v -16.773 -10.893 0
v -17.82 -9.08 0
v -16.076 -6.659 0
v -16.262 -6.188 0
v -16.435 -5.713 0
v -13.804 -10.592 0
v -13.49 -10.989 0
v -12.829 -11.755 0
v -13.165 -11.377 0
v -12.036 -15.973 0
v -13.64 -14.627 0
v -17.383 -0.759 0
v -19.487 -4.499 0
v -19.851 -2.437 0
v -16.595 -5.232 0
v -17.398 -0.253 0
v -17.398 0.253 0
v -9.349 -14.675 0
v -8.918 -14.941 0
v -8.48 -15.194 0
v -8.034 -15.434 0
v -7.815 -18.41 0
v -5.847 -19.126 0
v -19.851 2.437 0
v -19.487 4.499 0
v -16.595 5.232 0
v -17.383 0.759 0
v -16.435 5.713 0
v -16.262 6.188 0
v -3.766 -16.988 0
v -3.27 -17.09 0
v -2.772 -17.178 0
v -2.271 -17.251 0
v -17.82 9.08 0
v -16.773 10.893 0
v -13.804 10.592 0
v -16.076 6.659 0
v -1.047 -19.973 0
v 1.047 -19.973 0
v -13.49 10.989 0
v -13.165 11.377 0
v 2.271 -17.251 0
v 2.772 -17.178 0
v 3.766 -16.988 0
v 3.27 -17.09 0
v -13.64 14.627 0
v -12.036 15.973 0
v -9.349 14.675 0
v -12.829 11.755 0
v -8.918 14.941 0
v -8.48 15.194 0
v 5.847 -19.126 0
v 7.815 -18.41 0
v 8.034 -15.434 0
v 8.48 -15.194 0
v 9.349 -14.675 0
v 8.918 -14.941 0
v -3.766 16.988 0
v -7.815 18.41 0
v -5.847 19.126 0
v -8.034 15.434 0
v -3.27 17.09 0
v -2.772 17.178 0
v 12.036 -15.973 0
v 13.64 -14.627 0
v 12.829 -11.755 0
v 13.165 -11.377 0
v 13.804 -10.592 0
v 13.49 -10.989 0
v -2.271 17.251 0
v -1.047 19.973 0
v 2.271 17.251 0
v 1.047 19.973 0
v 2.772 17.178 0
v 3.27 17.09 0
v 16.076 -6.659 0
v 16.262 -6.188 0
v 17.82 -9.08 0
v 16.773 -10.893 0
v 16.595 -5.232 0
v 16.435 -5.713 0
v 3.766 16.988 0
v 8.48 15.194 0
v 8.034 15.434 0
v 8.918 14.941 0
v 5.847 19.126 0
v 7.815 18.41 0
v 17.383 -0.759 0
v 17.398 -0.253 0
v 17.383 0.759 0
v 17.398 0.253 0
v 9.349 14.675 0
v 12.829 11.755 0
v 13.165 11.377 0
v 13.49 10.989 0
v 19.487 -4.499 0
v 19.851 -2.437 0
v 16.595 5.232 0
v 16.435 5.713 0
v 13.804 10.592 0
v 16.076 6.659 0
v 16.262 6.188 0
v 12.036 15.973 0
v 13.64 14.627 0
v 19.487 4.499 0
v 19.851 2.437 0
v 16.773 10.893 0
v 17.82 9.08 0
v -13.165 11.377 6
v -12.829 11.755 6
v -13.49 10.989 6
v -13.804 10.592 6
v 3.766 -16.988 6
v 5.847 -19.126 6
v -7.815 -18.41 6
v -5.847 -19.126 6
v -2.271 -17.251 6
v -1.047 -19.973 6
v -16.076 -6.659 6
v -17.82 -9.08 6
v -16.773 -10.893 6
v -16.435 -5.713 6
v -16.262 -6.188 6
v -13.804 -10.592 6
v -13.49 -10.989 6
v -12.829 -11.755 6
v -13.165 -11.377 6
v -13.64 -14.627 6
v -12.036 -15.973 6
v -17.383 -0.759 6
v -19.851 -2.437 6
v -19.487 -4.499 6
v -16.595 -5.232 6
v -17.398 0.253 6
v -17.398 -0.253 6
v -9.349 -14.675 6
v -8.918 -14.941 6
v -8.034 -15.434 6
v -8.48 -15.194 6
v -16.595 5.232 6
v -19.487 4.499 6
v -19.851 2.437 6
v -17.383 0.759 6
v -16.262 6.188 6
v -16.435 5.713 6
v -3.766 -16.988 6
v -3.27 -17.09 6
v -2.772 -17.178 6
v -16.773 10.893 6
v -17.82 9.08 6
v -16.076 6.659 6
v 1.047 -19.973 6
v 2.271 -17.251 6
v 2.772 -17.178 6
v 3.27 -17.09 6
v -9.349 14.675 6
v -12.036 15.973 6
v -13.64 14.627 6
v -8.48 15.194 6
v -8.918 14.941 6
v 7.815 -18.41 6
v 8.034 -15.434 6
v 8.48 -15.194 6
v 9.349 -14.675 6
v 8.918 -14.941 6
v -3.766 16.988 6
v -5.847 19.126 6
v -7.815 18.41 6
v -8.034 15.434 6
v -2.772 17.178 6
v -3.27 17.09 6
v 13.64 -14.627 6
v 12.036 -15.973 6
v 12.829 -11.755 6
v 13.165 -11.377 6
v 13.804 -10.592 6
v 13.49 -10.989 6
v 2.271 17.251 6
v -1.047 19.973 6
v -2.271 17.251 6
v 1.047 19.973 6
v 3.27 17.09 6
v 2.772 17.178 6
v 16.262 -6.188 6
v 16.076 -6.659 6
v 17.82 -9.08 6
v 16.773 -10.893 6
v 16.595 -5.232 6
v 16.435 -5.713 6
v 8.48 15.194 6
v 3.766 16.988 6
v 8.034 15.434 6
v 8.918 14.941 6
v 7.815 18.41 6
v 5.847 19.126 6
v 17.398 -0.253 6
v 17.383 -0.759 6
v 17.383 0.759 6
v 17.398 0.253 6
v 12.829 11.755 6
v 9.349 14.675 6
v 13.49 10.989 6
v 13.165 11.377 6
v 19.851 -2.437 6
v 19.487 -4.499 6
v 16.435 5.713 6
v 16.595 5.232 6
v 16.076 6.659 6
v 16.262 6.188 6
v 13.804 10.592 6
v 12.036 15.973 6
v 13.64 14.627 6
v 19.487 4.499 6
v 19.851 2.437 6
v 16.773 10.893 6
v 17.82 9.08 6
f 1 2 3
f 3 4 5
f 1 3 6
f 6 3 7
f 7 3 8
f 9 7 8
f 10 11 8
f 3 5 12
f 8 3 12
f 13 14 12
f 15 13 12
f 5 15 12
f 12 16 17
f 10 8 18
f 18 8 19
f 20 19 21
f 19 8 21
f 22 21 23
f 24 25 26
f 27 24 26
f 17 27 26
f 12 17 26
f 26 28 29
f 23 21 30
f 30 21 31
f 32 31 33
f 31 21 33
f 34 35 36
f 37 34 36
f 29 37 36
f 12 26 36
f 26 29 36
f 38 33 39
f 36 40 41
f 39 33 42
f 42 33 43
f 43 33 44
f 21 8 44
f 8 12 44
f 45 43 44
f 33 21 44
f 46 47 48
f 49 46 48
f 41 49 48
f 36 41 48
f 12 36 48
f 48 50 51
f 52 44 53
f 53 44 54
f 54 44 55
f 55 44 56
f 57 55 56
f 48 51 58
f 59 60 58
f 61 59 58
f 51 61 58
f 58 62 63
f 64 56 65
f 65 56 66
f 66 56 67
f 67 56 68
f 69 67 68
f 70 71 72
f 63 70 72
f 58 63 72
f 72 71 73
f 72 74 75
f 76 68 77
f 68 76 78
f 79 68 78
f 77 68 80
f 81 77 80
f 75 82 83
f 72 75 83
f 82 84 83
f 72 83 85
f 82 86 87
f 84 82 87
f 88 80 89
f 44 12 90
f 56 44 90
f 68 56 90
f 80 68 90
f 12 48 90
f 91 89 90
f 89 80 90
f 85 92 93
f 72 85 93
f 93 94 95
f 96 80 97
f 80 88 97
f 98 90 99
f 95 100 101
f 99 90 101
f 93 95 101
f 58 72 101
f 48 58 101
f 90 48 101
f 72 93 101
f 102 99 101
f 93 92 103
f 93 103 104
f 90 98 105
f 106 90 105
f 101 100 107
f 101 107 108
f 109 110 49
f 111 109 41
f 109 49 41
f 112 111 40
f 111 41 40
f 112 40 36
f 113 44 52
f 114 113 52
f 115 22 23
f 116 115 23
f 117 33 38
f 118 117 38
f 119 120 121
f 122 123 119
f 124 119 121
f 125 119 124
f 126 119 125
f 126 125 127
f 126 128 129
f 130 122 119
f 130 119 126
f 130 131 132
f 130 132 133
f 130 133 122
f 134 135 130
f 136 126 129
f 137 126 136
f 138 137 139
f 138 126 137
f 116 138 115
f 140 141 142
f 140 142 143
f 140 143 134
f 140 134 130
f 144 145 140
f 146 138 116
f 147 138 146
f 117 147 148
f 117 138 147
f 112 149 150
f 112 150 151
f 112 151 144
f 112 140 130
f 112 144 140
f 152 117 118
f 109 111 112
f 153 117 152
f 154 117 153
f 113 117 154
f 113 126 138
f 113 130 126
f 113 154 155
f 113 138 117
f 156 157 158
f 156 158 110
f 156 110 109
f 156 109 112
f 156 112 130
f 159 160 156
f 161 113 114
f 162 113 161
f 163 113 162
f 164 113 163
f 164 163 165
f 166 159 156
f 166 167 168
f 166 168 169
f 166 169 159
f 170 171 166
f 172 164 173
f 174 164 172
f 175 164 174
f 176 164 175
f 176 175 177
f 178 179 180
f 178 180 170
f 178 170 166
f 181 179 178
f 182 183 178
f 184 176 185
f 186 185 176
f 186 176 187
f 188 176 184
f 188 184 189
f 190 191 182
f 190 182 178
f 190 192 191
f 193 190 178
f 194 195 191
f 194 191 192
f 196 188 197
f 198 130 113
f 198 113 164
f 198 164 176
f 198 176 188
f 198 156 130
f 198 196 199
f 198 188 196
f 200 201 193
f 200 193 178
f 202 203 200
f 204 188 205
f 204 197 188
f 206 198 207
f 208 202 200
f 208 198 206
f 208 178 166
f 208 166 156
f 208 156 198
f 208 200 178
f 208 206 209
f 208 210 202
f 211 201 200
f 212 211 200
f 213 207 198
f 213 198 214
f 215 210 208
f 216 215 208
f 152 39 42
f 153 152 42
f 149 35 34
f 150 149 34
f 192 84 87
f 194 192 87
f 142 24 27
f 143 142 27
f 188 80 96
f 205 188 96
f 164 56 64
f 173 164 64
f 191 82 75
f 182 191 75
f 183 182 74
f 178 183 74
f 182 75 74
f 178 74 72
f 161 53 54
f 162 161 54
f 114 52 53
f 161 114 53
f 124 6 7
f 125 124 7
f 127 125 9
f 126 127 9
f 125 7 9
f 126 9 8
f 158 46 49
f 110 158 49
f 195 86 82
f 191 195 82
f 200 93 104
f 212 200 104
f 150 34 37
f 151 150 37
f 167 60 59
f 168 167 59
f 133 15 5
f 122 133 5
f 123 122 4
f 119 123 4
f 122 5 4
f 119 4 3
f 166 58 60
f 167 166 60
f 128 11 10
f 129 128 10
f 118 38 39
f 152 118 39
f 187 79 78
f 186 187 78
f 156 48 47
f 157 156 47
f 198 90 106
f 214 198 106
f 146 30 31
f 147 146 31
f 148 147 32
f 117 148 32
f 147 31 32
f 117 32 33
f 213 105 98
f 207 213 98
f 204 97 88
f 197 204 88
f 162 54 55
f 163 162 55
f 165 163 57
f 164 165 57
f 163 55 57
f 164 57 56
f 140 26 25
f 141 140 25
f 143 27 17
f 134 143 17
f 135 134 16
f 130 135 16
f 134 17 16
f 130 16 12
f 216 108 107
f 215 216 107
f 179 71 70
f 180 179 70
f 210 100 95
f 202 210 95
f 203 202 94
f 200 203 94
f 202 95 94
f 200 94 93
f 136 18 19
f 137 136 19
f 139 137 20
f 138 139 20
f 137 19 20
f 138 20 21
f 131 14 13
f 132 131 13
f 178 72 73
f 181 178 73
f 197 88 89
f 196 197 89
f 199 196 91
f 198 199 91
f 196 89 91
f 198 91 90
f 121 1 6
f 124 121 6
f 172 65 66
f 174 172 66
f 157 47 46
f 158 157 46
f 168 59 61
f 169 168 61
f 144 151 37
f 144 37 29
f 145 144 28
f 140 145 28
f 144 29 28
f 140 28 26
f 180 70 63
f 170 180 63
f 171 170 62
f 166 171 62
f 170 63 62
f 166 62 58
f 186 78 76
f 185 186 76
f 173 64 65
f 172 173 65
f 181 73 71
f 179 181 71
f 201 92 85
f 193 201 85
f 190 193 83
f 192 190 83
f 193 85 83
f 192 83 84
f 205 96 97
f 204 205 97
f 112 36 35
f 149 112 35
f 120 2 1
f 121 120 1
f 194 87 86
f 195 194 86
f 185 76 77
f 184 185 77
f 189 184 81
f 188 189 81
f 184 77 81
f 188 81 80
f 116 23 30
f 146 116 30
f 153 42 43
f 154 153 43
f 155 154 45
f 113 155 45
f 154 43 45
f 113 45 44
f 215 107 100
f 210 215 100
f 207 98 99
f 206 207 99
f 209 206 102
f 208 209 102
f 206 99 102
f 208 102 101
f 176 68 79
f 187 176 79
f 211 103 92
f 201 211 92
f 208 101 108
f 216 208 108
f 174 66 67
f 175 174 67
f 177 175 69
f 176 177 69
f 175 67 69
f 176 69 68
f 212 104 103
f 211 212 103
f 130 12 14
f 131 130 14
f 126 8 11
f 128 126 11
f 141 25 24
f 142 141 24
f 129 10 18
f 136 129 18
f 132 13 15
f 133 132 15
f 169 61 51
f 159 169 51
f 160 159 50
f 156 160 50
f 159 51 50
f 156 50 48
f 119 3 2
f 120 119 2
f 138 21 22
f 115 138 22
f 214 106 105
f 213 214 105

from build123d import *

# Parameters (mm, degrees)
F1_R     = 17.4
F2_DEPTH = 6
F4_COUNT = 18


with BuildPart() as f2:
    # F1 (on Top) + F0 (on Top) → F2 (new body)
    with BuildSketch(Plane.XY):
        Circle(F1_R)
    with BuildSketch(Plane.XY):
        Polygon((-1.046719, 19.972591), (-2.271156, 17.251141), (2.271156, 17.251141), (1.046719, 19.972591), (0, 19.972591), align=None)
    extrude(amount=F2_DEPTH)

    # F4: F2 ×18 about axis
    f4_axis = Axis((0, 0, 1.5), (0, 0, 1))


with BuildPart() as f2_1:
    add(f2.part)
    for i in range(1, F4_COUNT):
        add(f2.part.rotate(f4_axis, i * 360 / F4_COUNT))


solid = f2_1.part
